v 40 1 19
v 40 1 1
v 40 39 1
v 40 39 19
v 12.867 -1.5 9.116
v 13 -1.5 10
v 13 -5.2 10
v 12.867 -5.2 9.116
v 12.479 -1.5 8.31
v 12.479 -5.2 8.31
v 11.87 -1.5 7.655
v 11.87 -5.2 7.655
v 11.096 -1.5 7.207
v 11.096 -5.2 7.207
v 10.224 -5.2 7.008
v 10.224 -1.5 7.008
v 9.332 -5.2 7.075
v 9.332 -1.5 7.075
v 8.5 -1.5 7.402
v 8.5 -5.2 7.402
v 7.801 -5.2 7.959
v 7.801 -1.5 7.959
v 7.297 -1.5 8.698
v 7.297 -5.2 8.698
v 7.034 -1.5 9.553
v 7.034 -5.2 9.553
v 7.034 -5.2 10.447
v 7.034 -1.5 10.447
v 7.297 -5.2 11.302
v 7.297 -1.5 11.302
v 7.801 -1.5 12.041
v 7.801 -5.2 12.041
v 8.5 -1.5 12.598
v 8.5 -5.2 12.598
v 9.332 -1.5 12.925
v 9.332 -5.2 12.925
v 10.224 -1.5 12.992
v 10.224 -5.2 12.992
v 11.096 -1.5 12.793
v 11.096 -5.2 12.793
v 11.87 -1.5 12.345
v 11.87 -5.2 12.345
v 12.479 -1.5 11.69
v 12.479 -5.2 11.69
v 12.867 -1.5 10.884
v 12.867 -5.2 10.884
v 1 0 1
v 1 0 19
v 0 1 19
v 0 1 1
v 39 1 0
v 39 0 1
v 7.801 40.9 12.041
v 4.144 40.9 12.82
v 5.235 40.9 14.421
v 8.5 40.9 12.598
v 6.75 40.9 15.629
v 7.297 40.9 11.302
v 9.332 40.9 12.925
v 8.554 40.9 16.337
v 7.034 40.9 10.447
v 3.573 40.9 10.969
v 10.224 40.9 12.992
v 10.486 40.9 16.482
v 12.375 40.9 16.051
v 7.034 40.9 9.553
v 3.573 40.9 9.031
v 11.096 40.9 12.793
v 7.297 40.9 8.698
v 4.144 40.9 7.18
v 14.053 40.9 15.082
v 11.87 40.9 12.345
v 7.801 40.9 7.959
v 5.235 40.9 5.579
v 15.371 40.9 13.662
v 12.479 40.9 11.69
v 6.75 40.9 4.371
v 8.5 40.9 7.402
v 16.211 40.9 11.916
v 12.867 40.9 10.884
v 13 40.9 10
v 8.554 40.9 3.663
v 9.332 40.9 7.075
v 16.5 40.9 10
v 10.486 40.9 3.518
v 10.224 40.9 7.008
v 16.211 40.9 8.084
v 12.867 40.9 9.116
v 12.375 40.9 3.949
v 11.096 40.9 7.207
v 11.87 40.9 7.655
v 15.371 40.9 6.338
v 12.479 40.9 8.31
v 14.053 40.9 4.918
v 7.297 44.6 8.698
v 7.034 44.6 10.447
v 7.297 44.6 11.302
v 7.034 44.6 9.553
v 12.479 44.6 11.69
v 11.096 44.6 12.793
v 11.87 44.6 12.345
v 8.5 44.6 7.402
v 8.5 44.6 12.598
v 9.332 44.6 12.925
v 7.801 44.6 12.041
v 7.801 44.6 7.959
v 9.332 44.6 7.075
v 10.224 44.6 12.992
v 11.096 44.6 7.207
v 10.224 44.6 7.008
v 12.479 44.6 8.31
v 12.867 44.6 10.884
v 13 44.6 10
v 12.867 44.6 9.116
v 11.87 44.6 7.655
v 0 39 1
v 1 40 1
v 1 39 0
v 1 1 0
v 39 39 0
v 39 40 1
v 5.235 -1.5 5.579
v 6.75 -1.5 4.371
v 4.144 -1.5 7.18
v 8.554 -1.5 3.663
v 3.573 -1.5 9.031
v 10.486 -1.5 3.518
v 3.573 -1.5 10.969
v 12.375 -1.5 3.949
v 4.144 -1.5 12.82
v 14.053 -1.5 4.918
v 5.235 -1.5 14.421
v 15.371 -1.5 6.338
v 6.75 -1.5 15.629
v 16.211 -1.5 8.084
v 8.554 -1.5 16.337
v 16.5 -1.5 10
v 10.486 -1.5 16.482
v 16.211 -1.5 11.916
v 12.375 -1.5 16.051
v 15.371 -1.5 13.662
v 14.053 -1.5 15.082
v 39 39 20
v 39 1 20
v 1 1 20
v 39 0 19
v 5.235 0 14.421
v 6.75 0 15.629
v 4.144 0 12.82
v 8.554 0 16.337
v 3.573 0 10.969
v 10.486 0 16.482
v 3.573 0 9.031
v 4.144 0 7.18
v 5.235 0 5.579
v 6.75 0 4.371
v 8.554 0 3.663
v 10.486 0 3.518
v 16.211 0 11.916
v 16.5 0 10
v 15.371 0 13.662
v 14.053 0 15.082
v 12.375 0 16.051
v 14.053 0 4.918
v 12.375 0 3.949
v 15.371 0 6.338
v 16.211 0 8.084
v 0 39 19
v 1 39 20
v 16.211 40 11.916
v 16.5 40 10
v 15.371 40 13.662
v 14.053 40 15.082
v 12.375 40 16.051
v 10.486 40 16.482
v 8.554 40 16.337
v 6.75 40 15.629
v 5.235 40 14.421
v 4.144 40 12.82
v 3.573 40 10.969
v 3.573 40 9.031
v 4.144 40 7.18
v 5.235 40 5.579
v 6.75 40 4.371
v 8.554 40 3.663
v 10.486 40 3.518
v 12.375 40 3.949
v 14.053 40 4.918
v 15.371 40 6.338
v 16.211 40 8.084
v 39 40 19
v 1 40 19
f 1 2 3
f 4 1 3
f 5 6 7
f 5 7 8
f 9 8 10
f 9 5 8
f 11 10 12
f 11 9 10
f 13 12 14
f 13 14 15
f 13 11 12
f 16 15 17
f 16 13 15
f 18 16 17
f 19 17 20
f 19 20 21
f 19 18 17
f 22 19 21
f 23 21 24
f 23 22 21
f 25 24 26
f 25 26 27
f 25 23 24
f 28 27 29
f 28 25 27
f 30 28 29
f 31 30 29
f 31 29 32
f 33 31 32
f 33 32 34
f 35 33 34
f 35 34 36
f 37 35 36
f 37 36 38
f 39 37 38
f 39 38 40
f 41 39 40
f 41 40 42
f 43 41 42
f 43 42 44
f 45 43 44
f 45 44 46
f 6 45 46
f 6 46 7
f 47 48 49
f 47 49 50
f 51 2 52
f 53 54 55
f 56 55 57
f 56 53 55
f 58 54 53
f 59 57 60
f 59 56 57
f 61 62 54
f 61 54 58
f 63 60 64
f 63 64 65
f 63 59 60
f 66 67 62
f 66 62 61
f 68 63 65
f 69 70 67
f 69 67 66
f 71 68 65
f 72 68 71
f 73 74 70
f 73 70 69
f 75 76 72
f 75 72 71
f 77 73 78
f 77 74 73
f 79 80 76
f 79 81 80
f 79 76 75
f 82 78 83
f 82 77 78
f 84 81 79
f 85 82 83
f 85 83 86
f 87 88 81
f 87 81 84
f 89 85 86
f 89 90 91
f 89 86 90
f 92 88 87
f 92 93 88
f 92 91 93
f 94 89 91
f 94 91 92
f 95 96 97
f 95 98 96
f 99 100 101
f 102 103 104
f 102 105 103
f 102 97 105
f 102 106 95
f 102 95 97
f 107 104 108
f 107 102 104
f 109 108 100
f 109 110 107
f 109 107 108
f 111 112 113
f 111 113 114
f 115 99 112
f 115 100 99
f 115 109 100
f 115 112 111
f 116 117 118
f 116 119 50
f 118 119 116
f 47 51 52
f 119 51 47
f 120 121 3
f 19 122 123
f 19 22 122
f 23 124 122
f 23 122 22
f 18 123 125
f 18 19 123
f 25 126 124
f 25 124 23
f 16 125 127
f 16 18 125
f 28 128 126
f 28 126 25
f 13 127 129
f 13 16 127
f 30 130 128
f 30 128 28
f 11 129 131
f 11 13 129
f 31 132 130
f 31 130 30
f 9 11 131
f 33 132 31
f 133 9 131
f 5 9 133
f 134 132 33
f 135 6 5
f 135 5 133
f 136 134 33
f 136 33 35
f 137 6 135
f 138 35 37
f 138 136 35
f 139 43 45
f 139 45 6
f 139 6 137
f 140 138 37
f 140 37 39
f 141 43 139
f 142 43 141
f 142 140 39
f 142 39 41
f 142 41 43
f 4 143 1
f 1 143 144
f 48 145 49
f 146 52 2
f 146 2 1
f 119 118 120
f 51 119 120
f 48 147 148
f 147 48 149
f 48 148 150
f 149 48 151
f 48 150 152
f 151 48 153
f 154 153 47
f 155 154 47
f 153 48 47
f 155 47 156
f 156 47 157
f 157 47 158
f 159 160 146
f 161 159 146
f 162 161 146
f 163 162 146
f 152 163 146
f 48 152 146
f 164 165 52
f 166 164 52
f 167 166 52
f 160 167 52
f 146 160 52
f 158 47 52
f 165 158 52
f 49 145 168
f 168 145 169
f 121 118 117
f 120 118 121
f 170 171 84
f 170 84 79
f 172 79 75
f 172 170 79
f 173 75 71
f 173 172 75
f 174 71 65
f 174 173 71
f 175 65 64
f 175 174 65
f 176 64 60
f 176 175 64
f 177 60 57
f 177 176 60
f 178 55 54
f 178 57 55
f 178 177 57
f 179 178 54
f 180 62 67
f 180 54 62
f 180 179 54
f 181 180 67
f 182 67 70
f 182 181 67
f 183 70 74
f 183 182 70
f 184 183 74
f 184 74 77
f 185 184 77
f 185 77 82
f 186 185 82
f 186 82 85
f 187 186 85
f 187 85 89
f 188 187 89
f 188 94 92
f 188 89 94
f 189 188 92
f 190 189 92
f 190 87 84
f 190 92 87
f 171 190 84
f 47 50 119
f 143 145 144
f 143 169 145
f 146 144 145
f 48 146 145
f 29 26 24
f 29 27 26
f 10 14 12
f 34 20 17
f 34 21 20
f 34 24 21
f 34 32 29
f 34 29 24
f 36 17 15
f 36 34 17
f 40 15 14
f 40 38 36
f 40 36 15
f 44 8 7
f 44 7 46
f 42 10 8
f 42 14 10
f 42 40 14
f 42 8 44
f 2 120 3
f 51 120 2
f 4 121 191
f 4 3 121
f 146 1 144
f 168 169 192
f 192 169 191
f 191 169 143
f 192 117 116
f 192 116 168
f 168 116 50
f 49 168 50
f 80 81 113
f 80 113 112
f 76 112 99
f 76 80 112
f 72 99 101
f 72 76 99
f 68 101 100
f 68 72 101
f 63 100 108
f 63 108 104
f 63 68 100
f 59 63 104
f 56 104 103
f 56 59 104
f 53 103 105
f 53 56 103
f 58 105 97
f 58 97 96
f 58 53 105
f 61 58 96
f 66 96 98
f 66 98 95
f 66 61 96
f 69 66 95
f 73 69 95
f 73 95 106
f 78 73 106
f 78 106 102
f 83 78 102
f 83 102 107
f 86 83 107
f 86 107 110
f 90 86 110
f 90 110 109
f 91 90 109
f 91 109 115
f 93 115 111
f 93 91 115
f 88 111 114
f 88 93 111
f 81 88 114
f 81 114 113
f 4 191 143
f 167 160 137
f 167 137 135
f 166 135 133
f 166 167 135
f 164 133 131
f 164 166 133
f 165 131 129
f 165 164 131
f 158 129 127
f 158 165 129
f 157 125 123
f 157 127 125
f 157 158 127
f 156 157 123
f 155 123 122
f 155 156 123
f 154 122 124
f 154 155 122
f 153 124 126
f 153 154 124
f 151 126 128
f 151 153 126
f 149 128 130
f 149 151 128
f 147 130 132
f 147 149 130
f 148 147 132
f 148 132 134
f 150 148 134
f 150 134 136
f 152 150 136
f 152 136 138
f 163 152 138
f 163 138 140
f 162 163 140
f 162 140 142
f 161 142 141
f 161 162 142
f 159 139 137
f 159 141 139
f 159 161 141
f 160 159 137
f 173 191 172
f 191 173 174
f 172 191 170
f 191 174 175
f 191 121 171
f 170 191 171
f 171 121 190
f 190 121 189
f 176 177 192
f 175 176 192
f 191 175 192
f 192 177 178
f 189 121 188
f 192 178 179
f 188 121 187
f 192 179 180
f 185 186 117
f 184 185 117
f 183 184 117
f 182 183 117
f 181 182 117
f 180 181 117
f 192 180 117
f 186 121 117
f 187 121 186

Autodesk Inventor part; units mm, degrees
ref_plane "YZ Plane" through (0, 0, 0) normal (1, 0, 0) x (0, 1, 0)
ref_plane "XZ Plane" through (0, 0, 0) normal (0, 1, 0) x (-1, 0, 0)
ref_plane "XY Plane" through (0, 0, 0) normal (0, 0, 1) x (1, 0, 0)
sketch "Sketch1" plane through (0, 0, 0) normal (0, 0, 1) x (1, 0, 0)
  line L0 (0, 0) -> (40, 0)
  line L1 (40, 0) -> (40, 40)
  line L2 (40, 40) -> (0, 40)
  line L3 (0, 40) -> (0, 0)
  dimension "d0" = 40
  dimension "d1" = 40
extrude "Extrusion1" add sketch "Sketch1" along normal blind 20
chamfer "Chamfer1" distance 1 angle 45 12 edges at (20, 40, 20) (20, 40, 0) (40, 40, 10) (40, 20, 20) (40, 20, 0) (40, 0, 10) (20, 0, 20) (0, 20, 20) (0, 40, 10) (0, 20, 0) (0, 0, 10) (20, 0, 0)
sketch "Sketch2" plane through (1, 40, 1) normal (0, 1, 0) x (1, 0, 0)
  line L0 (-1, -18) -> (-1, 0) projected
  line L1 (-1, -9) -> (9, -9)
  circle A0 centre (9, -9) radius 3
  point P0 (-1, 1)
  dimension "d7" = 10
  dimension "d8" = 6
extrude "Extrusion2" add sketch "Sketch2" along normal blind 4.6
sketch "Sketch3" plane through (1, 40, 1) normal (0, 1, 0) x (1, 0, 0)
  circle A0 centre (9, -9) radius 3 projected
  circle A1 centre (9, -9) radius 6.5
  point P0 (-1, 1)
  dimension "d11" = 13
extrude "Extrusion3" add sketch "Sketch3" along normal blind 0.9
sketch "Sketch5" plane through (1, 0, 19) normal (0, -1, 0) x (1, 0, 0)
  line L0 (-1, 0) -> (-1, -18) projected
  line L1 (-1, -9) -> (9, -9)
  circle A0 centre (9, -9) radius 3
  point P0 (-1, -19)
  dimension "d14" = 10
extrude "Extrusion4" add sketch "Sketch5" along normal blind 5.2
sketch "Sketch6" plane through (1, 0, 19) normal (0, -1, 0) x (1, 0, 0)
  circle A0 centre (9, -9) radius 3 projected
  circle A1 centre (9, -9) radius 6.5
  point P0 (-1, -19)
  dimension "d17" = 13
extrude "Extrusion5" add sketch "Sketch6" along normal blind 1.5 contours A0 | A1
properties part number "DualServo"
